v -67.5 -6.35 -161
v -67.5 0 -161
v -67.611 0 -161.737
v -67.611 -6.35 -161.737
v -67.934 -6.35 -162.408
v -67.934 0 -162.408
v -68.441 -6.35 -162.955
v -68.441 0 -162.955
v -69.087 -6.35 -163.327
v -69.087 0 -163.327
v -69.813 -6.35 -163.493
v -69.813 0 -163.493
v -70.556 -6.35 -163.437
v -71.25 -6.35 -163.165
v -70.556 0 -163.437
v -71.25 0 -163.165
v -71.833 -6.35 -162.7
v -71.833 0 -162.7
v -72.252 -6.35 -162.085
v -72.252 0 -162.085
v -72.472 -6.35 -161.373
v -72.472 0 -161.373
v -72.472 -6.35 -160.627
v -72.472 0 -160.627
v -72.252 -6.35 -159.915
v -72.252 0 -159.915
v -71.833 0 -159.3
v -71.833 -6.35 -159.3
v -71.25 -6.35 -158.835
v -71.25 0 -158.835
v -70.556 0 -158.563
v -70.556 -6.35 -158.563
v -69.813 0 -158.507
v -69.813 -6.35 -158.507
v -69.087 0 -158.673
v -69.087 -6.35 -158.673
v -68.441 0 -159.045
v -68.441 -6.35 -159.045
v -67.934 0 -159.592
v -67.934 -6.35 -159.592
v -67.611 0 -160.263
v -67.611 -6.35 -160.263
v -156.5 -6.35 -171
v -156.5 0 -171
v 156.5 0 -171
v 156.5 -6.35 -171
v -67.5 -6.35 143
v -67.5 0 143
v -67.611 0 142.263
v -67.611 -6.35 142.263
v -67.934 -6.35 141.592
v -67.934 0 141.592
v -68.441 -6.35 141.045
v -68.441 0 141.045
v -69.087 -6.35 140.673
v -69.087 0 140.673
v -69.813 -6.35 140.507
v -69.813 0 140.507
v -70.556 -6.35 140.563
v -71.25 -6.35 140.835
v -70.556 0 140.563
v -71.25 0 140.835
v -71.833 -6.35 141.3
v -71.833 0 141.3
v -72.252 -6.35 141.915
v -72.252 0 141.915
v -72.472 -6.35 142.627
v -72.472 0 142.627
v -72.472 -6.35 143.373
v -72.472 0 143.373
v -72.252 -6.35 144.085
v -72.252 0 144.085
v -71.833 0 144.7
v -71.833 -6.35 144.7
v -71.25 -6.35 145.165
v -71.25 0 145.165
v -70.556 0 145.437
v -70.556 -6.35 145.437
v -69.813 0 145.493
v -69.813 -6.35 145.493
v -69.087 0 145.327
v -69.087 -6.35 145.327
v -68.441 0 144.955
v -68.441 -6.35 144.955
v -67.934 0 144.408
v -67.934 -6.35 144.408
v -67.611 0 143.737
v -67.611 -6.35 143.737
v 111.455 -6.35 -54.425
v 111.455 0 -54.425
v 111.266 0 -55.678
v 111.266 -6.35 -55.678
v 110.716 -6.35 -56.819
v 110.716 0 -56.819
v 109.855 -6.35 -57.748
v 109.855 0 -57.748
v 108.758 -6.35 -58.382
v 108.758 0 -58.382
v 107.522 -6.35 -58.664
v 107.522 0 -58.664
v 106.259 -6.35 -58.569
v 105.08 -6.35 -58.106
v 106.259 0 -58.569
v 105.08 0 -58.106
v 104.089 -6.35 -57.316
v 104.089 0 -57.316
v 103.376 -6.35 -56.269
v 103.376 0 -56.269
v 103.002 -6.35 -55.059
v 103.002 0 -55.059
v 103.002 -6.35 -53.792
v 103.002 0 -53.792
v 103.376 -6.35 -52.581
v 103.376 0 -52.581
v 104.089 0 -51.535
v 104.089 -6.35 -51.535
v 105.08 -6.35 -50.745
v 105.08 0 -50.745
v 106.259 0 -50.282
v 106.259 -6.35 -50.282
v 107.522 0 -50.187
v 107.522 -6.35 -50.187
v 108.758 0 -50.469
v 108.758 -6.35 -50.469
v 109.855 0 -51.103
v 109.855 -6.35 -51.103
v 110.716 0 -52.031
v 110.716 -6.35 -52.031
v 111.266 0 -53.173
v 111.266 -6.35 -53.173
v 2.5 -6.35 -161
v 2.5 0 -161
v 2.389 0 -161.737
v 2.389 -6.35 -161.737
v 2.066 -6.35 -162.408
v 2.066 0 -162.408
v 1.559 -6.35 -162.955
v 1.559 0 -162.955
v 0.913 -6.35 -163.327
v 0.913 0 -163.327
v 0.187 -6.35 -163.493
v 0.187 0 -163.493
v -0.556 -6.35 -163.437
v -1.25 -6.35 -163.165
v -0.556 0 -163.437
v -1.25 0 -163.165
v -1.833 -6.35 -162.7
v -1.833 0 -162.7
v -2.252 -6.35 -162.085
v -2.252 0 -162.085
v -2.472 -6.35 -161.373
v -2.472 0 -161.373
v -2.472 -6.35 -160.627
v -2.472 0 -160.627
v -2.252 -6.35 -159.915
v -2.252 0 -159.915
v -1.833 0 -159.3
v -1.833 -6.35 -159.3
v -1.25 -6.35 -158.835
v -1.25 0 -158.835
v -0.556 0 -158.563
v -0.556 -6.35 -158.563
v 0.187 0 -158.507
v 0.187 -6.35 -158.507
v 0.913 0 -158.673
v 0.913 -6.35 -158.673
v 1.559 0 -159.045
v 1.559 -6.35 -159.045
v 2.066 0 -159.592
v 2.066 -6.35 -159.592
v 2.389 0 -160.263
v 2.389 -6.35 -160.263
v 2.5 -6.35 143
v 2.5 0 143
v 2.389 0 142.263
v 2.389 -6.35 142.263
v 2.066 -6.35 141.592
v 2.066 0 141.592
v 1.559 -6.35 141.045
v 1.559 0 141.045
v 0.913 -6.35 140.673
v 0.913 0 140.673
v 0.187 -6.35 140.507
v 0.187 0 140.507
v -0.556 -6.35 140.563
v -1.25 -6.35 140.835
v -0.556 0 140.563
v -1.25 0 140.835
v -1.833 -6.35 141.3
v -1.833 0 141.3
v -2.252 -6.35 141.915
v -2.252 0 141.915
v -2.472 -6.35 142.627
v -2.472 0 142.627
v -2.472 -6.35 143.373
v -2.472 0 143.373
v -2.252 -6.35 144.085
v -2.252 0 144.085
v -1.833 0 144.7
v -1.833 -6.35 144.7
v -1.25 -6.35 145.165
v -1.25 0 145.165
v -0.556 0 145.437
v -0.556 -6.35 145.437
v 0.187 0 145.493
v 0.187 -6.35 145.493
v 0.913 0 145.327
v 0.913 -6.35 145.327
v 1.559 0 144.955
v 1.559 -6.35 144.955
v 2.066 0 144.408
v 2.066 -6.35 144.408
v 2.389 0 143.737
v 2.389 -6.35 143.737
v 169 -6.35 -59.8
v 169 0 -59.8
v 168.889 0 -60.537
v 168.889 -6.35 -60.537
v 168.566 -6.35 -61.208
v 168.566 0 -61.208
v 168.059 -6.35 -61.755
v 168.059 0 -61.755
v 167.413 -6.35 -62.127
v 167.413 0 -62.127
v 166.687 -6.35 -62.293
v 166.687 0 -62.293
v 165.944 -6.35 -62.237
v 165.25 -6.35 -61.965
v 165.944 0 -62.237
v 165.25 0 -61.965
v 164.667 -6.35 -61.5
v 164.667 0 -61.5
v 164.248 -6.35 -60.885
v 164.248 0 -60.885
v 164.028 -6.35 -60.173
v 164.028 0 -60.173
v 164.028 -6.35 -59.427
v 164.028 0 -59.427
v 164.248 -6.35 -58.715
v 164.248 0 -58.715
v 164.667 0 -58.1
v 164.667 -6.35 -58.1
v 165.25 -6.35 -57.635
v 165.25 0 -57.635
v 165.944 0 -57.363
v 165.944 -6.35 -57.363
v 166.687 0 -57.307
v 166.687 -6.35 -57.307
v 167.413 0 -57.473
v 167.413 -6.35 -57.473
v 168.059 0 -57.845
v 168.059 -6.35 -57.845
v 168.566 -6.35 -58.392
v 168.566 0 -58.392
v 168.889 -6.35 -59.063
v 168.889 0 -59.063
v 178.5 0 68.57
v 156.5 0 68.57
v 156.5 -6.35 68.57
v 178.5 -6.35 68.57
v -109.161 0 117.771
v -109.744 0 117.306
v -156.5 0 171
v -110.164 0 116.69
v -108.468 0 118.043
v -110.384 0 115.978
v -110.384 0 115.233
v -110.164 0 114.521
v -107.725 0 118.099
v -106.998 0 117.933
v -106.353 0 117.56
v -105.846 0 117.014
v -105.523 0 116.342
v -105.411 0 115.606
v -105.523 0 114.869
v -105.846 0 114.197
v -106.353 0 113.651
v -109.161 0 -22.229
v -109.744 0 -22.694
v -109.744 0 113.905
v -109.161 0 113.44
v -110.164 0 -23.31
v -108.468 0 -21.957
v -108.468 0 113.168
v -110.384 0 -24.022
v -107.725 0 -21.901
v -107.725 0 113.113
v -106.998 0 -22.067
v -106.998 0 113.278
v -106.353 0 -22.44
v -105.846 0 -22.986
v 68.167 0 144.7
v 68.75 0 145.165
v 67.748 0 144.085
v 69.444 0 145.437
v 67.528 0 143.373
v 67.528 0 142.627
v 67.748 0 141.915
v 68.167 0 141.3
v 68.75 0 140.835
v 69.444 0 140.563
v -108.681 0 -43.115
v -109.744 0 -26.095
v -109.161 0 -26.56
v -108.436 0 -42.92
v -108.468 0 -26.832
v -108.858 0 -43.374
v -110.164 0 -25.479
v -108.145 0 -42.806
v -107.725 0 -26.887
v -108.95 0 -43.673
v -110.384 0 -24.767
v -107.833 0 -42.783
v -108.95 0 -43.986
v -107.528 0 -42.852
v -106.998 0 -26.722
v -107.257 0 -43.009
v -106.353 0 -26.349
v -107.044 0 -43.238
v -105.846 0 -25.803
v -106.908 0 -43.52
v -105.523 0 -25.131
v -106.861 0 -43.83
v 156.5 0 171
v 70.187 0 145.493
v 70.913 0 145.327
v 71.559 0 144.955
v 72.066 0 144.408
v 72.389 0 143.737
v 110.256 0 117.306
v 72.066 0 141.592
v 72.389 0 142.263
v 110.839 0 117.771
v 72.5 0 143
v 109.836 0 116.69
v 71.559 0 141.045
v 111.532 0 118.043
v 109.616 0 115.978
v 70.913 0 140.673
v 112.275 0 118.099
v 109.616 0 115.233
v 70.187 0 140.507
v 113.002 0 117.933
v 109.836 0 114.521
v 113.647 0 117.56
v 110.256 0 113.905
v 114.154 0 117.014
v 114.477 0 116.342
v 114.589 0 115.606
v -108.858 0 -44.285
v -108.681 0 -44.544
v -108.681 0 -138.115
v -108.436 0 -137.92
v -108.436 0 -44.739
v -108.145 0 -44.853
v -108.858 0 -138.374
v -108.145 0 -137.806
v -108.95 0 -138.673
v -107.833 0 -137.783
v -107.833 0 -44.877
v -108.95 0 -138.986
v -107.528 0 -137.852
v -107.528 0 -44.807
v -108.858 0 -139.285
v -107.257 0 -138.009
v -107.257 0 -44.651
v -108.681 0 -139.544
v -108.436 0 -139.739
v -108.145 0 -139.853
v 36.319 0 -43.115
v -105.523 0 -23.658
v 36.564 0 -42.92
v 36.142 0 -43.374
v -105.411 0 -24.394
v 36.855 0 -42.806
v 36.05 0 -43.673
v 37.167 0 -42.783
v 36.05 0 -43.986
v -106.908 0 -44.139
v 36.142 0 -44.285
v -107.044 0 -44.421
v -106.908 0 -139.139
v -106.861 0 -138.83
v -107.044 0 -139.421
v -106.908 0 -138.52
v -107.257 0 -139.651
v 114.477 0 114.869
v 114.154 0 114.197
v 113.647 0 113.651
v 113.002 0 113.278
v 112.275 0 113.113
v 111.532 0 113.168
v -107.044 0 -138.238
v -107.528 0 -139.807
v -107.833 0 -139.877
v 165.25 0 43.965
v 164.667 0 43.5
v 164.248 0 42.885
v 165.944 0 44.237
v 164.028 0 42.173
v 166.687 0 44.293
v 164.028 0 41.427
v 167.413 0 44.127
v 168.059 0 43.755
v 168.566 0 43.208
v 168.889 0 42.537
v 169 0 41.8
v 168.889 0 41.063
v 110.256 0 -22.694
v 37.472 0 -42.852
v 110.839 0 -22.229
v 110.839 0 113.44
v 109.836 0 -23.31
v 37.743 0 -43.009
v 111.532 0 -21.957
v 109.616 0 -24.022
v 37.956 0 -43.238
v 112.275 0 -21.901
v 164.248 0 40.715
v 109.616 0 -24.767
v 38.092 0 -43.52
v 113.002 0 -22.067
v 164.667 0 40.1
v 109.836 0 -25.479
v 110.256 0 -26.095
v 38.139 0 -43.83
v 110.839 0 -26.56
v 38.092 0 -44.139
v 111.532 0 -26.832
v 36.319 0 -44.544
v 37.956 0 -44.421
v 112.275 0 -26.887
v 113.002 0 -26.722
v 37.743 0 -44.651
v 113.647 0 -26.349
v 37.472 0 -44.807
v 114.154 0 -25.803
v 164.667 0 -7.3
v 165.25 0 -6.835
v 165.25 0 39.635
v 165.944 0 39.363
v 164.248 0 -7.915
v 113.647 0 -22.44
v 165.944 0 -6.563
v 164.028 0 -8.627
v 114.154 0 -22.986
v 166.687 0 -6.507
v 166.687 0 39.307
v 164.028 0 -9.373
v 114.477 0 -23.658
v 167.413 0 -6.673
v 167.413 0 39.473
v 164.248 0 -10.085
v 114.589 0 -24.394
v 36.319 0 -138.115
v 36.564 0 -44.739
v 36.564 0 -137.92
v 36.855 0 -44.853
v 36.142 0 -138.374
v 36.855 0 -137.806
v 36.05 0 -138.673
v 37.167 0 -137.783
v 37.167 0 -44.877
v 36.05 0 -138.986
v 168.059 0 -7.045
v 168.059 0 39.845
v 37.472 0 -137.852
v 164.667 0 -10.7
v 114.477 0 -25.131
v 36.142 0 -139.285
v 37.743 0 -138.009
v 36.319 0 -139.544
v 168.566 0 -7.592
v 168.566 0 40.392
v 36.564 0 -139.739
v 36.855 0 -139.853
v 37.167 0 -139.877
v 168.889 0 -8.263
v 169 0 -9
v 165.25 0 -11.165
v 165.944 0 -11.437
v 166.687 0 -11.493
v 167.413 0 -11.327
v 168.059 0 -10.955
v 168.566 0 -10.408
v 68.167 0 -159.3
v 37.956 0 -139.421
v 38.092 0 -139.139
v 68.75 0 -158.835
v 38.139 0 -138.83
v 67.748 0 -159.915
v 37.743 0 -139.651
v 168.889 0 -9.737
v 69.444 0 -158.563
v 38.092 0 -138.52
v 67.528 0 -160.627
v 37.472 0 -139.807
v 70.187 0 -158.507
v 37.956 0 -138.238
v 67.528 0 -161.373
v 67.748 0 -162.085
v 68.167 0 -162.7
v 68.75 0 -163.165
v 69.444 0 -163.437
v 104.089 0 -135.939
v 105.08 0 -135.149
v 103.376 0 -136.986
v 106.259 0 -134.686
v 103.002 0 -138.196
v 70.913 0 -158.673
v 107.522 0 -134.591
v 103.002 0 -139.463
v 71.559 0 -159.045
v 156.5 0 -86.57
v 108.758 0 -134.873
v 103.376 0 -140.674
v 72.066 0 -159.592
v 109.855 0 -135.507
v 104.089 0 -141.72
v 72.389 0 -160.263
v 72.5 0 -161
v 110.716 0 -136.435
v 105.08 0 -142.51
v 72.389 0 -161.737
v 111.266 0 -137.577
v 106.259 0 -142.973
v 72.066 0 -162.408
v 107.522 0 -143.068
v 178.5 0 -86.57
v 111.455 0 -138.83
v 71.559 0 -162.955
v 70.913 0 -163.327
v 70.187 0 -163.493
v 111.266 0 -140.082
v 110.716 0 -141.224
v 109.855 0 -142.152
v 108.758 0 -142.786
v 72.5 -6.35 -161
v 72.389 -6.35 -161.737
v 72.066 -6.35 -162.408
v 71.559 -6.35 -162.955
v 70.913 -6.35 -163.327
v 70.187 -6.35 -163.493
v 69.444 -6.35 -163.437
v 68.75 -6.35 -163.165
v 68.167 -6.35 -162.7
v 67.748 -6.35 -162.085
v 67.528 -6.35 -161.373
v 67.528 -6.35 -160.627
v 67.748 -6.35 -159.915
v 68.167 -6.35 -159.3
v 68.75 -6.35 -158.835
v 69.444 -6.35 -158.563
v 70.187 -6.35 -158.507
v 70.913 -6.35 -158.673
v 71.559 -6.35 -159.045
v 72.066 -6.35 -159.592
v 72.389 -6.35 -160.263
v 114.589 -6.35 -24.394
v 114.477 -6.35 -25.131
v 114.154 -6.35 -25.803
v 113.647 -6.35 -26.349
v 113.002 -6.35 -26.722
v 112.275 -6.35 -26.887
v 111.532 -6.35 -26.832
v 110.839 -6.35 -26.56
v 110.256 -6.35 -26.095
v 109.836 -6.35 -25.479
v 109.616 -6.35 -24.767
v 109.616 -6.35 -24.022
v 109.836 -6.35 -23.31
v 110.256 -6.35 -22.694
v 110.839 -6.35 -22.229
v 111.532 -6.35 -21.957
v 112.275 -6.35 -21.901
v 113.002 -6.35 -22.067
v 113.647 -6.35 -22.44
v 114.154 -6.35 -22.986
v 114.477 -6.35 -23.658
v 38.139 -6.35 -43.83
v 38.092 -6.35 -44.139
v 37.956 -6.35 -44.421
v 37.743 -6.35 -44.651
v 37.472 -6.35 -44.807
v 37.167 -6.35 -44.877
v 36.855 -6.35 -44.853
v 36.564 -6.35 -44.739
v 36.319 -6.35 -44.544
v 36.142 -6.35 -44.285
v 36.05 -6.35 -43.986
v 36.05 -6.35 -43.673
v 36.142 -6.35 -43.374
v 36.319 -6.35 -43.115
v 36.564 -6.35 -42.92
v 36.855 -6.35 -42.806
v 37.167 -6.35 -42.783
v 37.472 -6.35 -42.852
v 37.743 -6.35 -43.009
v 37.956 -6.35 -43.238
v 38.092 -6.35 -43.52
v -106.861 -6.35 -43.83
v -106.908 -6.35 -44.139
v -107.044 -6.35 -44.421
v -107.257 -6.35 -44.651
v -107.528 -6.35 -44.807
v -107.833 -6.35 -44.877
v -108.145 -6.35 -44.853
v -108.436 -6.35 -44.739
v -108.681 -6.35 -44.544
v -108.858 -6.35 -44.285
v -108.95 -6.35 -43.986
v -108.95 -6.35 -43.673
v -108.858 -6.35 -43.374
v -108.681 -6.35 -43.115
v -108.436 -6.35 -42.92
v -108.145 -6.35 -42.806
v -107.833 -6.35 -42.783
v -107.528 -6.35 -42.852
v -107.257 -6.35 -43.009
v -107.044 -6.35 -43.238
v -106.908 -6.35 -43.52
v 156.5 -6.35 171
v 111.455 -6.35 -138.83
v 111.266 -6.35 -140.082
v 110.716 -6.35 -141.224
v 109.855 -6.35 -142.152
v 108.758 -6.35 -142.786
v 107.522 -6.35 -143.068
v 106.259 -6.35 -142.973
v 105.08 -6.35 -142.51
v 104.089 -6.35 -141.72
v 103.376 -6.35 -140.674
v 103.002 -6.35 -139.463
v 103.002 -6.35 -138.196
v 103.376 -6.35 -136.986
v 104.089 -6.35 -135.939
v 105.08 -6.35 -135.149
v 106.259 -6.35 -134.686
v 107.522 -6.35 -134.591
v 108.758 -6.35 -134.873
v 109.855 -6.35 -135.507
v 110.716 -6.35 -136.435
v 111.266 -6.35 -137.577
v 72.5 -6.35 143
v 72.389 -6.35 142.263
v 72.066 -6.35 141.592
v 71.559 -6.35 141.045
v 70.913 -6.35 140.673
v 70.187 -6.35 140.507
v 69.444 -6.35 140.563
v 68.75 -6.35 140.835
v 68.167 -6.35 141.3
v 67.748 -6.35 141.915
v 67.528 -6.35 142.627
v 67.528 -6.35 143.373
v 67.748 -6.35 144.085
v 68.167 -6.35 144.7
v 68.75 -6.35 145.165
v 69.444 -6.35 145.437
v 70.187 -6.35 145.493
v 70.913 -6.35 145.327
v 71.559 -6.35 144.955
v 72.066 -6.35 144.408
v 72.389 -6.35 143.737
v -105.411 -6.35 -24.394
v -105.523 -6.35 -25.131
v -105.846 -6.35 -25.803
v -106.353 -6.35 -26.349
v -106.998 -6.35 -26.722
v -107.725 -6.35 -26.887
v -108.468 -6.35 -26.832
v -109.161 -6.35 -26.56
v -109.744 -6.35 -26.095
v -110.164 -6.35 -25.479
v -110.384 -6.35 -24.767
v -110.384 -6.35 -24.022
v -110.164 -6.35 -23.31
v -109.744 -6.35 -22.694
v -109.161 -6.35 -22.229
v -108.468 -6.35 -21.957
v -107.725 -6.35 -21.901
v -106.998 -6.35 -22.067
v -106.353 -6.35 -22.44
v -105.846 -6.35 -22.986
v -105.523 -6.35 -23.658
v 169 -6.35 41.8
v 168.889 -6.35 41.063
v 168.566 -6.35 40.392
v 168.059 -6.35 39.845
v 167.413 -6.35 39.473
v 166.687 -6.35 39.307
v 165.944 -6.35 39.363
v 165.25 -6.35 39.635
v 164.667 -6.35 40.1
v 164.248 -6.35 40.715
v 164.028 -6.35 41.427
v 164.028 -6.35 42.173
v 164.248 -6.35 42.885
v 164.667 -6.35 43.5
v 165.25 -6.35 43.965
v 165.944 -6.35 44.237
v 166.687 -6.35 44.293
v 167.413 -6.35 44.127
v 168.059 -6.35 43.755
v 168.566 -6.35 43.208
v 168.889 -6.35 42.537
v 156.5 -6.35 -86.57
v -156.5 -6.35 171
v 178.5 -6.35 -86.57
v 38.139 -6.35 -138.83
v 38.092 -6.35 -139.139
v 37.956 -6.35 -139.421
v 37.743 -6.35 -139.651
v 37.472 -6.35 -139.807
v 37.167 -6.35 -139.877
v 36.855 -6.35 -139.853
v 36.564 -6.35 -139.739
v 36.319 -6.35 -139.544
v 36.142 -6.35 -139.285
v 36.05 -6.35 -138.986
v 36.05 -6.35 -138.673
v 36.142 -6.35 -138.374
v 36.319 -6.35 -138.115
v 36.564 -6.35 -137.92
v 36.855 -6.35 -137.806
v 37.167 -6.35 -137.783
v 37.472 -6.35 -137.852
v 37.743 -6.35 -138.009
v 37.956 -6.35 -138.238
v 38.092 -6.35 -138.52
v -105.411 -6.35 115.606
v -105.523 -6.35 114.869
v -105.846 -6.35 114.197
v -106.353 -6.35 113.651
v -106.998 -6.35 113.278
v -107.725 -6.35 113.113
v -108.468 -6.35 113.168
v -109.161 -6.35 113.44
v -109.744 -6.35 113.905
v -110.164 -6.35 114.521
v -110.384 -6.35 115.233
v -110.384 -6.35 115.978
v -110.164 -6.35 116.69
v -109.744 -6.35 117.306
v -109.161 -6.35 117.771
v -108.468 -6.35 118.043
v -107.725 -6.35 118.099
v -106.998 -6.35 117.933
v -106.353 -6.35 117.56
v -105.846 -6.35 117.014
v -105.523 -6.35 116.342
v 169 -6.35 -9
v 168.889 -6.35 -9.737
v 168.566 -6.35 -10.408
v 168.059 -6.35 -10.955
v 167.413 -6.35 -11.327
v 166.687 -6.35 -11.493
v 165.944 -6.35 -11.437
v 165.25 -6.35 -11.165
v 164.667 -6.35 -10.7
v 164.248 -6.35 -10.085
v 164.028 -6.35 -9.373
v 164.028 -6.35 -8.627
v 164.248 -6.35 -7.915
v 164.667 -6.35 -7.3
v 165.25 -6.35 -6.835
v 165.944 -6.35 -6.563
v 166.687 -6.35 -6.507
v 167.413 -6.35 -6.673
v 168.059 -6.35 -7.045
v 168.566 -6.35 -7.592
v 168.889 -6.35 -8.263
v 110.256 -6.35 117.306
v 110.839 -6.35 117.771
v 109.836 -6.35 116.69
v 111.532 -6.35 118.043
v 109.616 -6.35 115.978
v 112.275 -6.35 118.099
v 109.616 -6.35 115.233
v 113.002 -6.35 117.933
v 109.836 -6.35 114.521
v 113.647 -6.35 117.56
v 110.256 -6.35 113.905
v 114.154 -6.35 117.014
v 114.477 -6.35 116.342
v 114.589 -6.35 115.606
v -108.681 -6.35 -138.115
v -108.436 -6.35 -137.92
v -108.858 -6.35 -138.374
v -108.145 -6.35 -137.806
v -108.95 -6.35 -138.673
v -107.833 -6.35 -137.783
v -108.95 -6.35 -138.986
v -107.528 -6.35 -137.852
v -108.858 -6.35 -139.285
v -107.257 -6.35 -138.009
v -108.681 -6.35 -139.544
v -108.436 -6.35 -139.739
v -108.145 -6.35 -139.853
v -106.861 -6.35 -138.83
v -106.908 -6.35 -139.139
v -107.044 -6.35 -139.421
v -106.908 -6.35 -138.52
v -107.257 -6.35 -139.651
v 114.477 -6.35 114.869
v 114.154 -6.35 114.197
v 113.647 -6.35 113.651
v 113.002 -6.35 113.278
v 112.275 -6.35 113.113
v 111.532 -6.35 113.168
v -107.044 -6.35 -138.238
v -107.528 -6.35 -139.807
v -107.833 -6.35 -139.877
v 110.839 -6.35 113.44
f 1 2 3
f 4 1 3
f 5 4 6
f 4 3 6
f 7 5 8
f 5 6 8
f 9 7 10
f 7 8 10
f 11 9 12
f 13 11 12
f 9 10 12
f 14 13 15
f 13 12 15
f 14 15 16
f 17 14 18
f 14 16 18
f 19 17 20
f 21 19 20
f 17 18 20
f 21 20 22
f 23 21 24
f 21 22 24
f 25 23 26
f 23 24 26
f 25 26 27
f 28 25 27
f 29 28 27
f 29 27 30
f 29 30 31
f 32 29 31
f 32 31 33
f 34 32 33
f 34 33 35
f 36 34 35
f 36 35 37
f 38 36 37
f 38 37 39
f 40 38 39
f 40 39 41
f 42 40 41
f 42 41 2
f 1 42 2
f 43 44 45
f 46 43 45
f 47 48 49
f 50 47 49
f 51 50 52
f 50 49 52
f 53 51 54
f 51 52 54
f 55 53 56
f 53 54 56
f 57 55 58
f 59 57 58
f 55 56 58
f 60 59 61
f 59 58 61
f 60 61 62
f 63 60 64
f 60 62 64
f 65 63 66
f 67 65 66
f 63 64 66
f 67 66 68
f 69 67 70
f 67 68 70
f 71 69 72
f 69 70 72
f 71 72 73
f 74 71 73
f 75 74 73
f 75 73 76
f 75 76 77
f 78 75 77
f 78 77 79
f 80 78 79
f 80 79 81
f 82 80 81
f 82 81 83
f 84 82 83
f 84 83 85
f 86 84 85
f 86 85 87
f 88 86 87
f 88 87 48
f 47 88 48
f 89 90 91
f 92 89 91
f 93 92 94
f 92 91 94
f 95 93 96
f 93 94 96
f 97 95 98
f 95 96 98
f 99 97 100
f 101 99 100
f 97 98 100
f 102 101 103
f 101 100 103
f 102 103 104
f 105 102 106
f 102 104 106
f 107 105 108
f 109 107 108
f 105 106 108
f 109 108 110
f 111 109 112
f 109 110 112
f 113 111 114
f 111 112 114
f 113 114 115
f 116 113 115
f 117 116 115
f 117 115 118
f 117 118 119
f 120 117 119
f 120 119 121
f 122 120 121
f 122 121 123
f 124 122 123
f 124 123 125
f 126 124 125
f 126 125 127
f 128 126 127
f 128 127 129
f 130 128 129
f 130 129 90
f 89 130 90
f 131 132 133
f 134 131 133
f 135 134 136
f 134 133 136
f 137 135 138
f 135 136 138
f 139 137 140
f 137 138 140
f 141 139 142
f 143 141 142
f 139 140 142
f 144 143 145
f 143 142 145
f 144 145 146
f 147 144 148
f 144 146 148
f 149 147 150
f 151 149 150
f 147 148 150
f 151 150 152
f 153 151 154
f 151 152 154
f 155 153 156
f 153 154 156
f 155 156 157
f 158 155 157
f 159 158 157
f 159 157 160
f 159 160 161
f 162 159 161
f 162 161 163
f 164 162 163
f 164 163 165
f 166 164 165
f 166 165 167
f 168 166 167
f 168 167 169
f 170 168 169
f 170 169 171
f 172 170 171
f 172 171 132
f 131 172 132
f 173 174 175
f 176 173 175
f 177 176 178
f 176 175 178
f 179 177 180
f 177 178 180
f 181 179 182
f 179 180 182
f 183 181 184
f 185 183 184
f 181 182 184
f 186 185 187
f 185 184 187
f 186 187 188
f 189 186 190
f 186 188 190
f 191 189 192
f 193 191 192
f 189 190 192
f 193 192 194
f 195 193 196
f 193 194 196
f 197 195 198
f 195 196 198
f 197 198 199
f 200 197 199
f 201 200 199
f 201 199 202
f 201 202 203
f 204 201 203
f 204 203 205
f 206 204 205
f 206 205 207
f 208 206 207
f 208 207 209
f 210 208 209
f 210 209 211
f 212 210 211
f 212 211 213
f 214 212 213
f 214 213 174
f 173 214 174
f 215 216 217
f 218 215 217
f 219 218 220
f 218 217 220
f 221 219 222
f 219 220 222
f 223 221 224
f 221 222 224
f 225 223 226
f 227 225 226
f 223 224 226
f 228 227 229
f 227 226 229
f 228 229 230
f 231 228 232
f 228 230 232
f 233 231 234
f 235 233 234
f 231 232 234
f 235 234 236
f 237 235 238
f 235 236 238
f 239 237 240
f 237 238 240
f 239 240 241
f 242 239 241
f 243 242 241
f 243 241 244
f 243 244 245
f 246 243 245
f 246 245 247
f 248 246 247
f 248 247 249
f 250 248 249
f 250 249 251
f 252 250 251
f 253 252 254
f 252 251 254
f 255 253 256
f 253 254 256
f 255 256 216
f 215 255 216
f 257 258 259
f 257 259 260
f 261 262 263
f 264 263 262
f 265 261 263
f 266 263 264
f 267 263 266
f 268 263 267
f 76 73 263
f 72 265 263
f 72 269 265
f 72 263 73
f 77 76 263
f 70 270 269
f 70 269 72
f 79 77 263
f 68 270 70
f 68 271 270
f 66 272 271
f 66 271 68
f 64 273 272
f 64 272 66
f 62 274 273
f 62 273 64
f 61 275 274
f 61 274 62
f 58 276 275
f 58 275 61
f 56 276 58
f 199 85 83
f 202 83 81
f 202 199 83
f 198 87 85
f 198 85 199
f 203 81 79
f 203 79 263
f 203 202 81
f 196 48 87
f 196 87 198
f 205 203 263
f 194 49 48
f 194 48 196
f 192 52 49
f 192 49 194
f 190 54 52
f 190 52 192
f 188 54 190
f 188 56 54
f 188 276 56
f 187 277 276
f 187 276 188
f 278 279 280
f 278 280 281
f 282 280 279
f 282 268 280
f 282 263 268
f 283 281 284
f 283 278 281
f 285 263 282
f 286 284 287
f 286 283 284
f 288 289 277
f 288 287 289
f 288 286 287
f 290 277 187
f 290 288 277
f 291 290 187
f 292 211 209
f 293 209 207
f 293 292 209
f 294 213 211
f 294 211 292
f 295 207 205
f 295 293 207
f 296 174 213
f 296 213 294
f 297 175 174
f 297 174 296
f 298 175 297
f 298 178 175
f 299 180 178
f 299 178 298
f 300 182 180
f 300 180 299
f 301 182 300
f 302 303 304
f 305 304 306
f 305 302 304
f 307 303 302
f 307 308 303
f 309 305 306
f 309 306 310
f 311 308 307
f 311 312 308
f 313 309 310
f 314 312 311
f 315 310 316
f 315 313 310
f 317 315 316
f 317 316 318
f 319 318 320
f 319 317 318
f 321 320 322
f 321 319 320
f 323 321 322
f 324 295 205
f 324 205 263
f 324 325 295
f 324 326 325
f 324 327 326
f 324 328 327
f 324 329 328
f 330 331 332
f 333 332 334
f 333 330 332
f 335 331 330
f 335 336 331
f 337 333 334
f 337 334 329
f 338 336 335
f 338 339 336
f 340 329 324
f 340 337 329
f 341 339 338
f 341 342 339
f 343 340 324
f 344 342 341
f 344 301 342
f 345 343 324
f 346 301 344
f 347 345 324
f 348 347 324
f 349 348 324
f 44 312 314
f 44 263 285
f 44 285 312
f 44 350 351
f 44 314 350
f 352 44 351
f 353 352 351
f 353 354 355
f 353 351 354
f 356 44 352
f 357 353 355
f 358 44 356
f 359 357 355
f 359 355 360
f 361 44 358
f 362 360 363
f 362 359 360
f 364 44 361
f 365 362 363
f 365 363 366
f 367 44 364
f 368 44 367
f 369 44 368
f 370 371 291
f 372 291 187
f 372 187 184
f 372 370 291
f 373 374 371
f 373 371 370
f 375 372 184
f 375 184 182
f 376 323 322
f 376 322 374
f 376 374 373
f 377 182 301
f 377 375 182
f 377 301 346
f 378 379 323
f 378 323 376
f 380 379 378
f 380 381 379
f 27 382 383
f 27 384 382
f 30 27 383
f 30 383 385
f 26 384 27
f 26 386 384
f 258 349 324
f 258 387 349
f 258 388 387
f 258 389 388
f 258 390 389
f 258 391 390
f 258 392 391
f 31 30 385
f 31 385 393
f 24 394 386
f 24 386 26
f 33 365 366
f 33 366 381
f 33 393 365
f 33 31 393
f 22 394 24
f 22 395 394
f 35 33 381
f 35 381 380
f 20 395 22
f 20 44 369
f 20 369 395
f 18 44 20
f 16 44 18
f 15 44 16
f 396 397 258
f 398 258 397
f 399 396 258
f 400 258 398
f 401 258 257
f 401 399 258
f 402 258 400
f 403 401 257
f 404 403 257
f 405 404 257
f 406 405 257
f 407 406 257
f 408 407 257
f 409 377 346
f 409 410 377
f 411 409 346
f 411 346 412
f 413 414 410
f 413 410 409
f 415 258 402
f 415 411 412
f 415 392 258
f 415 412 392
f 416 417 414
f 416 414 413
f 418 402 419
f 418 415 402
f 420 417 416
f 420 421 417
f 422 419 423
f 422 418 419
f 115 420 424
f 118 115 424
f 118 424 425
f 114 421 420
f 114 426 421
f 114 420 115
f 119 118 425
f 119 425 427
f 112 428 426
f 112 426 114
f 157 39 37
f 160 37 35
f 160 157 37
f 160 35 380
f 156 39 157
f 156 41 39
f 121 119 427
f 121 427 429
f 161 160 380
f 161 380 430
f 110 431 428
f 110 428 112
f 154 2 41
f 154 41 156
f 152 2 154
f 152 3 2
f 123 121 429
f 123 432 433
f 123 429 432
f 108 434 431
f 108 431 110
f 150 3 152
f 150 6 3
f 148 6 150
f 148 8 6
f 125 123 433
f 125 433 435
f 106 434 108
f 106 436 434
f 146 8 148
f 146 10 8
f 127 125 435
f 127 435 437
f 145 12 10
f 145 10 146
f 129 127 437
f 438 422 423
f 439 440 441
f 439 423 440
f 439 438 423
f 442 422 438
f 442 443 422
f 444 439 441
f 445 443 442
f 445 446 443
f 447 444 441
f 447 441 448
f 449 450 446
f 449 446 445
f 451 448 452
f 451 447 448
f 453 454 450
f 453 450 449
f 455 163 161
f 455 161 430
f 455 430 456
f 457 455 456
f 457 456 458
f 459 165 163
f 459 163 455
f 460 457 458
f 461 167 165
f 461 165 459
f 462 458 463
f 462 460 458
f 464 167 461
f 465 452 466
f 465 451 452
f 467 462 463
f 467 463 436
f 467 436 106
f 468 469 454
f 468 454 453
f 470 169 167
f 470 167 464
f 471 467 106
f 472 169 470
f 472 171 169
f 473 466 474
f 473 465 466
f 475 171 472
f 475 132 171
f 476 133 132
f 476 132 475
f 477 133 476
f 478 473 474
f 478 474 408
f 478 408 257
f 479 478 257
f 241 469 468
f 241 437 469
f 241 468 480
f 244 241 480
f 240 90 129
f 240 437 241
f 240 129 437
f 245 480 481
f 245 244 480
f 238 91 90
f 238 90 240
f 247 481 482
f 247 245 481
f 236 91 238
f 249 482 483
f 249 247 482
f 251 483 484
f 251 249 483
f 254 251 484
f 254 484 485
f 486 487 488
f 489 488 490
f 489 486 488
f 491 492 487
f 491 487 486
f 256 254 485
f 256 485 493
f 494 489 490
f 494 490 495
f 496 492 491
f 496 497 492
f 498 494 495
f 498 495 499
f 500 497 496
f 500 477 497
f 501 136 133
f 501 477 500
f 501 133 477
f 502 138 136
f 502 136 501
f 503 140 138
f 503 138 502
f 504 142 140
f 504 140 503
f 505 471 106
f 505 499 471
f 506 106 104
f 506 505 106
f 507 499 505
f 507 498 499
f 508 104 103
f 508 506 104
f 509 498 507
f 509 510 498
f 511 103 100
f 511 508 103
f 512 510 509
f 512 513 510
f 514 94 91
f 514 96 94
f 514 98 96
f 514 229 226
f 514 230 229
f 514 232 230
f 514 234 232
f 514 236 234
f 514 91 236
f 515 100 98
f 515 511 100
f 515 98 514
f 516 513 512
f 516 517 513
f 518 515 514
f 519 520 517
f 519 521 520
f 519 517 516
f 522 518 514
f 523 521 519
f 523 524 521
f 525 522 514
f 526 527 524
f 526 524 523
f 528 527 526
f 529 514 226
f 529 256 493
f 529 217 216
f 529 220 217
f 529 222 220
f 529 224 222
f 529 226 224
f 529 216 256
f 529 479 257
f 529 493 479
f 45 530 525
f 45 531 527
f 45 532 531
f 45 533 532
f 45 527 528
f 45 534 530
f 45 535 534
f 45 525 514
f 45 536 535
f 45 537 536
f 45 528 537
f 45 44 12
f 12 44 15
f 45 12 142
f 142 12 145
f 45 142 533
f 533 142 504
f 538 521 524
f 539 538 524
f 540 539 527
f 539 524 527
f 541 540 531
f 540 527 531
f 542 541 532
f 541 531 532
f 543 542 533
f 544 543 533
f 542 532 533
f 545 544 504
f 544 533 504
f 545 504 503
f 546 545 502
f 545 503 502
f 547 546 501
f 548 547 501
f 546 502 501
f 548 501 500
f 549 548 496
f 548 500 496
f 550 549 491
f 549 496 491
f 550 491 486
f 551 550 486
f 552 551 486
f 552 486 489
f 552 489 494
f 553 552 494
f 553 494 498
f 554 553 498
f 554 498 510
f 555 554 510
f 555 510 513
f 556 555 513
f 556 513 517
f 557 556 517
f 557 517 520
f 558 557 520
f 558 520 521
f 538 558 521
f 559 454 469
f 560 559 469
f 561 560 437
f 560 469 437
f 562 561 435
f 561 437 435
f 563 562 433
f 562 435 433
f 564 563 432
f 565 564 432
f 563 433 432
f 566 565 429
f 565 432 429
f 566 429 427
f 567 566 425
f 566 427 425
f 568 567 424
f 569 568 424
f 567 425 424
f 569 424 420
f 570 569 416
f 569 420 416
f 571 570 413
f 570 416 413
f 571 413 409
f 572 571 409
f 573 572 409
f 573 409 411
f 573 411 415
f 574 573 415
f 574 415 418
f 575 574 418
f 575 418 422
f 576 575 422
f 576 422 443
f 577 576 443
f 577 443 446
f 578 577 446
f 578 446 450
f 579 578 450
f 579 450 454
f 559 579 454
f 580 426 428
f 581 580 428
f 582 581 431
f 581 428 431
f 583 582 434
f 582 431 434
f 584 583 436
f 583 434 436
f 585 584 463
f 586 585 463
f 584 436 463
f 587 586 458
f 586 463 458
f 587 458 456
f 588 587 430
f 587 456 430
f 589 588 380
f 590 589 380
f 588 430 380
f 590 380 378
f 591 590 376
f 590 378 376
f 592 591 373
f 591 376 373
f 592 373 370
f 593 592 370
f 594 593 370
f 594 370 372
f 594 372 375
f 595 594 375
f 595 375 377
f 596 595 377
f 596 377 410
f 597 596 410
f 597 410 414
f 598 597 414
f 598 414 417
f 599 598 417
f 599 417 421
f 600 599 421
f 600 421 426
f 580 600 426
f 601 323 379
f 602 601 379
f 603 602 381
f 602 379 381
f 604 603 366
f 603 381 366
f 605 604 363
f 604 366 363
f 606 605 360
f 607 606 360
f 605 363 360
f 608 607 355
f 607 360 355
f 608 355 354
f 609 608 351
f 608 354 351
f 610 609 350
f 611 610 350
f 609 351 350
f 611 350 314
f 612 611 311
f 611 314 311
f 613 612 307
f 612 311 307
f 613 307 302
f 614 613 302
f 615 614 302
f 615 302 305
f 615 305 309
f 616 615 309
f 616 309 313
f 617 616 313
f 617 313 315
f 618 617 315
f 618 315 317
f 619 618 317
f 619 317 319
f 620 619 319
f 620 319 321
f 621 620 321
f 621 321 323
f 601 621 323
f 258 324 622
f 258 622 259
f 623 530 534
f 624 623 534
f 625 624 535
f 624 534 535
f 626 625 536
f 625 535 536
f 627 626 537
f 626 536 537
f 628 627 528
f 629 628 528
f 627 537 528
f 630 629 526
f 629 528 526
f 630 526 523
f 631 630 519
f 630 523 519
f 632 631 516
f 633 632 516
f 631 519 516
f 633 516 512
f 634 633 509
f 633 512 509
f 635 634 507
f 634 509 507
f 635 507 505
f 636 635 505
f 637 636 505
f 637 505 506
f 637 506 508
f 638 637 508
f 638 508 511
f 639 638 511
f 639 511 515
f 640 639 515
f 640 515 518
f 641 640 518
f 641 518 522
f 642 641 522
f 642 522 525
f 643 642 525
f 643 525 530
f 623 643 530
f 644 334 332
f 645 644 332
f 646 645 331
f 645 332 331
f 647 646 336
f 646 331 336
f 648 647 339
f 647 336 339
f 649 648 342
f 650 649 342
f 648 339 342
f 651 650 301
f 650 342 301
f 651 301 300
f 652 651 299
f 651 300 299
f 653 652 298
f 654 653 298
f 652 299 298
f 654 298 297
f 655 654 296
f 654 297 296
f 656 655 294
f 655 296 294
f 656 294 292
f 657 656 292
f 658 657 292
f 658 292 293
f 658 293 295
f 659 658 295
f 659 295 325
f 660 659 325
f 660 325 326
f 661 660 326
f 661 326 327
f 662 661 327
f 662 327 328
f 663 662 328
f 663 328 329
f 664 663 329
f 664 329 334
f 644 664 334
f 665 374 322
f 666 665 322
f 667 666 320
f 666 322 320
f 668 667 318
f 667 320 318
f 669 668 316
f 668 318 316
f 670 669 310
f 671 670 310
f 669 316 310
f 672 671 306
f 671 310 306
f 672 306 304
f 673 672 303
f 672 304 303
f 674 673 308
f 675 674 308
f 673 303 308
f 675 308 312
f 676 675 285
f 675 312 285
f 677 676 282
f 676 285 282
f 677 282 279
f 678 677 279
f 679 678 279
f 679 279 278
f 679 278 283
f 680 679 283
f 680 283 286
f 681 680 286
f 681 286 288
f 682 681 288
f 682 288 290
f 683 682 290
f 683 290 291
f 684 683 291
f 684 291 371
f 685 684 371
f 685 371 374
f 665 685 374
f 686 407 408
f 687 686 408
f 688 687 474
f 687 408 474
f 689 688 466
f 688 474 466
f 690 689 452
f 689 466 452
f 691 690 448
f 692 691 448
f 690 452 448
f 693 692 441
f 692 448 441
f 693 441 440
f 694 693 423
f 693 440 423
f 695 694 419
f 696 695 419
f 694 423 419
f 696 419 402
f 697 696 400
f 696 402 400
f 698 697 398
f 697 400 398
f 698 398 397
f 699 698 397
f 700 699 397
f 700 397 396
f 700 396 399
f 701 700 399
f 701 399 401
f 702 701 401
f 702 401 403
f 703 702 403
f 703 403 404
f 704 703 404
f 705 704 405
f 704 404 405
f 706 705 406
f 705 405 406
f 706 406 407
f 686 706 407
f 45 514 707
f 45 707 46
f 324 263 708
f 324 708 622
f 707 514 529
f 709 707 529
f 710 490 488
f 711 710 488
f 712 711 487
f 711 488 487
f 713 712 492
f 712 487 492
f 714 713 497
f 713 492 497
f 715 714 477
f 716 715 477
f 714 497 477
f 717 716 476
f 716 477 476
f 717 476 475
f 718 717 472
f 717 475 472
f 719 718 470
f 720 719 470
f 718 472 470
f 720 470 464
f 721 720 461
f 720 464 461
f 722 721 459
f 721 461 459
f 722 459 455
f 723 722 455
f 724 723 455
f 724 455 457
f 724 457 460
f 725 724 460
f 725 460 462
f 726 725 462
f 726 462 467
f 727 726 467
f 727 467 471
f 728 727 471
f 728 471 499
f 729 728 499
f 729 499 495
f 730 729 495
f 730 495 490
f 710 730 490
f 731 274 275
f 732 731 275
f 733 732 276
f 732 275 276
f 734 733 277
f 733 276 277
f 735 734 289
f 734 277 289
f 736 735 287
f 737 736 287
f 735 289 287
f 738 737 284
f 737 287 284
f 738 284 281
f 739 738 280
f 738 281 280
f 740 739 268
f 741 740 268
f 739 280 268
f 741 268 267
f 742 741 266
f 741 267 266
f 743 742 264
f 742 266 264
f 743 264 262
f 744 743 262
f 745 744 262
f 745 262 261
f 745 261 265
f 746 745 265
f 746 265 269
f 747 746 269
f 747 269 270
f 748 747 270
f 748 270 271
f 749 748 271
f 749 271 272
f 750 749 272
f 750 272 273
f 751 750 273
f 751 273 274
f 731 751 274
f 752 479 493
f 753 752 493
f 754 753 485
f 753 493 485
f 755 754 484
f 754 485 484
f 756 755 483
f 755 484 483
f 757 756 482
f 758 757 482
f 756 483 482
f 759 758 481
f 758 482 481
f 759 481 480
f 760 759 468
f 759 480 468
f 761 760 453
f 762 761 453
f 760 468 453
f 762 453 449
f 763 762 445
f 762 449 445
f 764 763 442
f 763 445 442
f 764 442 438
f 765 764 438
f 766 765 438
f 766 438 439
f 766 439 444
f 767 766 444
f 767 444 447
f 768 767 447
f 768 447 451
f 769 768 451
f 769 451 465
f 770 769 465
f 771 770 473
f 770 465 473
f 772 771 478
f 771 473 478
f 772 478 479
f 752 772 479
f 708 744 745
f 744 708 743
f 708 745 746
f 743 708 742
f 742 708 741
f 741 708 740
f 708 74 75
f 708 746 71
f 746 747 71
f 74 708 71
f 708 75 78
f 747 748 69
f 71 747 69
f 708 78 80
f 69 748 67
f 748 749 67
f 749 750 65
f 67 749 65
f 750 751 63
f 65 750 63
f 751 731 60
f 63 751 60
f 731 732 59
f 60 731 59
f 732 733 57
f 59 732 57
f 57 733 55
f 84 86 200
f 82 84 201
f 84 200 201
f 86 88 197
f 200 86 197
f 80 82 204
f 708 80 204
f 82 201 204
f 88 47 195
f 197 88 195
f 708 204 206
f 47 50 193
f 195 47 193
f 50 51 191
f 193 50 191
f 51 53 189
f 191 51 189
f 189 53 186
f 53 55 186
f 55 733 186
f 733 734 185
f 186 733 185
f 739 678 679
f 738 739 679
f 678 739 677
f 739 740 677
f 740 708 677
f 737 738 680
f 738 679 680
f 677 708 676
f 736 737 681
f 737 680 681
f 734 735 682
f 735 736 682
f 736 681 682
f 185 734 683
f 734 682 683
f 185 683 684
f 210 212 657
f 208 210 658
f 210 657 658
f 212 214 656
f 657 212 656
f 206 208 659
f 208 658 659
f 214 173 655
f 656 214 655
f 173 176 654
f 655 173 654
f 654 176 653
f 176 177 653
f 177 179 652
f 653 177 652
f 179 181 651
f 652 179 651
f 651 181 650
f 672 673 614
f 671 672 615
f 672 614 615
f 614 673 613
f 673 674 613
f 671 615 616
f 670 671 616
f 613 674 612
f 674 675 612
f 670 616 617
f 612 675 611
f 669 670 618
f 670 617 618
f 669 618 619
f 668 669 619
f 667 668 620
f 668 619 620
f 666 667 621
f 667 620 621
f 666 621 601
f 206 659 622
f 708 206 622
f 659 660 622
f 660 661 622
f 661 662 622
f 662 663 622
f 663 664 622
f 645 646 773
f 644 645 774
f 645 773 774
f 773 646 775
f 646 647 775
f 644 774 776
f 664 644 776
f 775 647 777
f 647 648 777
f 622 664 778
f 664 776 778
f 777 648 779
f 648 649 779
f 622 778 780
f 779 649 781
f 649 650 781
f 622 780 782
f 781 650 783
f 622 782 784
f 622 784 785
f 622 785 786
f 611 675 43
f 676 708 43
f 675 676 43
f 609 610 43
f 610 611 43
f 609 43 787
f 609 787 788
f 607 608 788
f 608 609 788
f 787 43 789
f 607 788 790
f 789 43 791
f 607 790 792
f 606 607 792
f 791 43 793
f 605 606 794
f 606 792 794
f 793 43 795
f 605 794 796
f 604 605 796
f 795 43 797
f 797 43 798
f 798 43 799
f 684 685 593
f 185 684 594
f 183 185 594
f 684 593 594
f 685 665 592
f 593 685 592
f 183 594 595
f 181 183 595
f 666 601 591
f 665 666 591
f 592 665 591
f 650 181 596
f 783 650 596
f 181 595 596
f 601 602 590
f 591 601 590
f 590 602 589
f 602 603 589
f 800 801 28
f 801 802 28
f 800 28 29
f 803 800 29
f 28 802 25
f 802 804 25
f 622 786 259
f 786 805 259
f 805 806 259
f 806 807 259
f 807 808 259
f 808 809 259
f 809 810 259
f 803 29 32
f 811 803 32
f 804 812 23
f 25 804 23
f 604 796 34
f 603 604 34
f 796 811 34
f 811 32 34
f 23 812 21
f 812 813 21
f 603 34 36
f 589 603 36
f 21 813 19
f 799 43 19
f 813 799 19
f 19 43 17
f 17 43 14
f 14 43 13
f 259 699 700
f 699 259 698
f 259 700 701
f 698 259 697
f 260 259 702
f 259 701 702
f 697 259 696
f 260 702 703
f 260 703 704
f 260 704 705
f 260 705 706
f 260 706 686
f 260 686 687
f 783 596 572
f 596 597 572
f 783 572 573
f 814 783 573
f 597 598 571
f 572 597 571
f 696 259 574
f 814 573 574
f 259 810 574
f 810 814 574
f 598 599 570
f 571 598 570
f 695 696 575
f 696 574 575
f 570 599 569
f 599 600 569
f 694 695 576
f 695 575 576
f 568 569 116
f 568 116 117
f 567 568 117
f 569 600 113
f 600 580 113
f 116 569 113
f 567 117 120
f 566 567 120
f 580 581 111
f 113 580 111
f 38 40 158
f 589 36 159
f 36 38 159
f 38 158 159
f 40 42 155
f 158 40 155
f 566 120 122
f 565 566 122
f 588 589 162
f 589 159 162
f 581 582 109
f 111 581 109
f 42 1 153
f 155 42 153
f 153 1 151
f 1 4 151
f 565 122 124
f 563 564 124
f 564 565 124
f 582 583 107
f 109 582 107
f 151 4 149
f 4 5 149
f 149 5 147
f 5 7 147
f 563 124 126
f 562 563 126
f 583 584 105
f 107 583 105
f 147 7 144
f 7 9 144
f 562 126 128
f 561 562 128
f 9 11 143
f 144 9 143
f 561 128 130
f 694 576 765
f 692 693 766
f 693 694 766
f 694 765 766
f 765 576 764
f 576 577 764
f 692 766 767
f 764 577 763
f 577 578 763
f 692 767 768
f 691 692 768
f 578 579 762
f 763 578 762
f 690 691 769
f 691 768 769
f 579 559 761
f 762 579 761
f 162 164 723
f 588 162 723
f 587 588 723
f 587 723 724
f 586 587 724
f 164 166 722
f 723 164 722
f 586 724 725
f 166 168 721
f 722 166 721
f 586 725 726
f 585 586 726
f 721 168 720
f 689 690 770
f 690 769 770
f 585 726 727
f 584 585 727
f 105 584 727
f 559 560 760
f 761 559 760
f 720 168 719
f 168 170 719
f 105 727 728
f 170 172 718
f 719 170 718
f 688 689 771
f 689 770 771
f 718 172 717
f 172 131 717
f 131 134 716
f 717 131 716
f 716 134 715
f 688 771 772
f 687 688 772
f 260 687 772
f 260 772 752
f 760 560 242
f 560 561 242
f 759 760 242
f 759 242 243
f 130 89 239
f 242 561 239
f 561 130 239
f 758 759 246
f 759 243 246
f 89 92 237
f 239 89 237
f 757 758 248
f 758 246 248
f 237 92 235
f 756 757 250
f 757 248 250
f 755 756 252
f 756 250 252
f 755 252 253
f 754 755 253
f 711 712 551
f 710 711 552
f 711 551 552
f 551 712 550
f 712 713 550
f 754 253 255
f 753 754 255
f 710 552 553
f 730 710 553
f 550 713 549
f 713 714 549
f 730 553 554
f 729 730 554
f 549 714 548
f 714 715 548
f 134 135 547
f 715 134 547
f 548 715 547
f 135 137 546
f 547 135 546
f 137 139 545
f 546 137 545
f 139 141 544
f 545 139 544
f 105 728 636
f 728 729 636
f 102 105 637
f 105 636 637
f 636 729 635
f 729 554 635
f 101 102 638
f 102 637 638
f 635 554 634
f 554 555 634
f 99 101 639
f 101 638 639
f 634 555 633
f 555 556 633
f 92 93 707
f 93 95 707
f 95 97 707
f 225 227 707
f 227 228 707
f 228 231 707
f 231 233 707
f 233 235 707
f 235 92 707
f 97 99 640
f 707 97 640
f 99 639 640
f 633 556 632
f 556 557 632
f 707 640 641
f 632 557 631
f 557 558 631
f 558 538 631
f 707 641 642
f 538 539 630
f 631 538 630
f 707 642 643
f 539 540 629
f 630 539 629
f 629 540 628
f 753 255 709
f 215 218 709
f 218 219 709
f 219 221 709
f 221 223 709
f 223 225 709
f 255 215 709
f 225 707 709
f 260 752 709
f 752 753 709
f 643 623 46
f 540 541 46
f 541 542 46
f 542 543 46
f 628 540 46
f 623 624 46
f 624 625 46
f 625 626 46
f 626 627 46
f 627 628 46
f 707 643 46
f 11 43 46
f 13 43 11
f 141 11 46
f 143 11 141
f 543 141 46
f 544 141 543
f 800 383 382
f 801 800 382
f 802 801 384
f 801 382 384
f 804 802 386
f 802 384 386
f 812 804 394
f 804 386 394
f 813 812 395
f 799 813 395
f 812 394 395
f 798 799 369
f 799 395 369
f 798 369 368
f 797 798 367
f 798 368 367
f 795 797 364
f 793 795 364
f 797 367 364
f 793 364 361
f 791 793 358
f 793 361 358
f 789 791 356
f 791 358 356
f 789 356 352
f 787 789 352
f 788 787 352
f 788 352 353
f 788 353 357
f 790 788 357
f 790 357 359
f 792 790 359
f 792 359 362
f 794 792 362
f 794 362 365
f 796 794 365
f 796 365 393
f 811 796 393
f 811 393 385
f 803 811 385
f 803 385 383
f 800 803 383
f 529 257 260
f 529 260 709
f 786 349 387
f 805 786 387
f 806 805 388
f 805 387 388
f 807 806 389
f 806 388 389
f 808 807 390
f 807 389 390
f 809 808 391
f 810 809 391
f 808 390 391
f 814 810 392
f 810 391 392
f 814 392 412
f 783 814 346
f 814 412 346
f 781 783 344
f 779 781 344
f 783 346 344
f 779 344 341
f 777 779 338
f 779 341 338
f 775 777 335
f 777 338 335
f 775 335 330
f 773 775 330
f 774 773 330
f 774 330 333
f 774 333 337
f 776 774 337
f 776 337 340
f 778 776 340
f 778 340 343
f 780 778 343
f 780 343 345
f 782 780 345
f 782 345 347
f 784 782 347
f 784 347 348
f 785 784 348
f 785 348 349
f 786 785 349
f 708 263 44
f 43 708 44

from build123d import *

# Parameters (mm, degrees)
SKETCH1_W           = 313
SKETCH1_H           = 342
BOSS_EXTRUDE1_DEPTH = 6.35
SKETCH3_W           = 22
SKETCH3_H           = 155.14040353
SKETCH3_R           = 2.5
BOSS_EXTRUDE2_DEPTH = 6.35
SKETCH2_R           = 2.5
CUT_EXTRUDE1_DEPTH  = 7.35
SKETCH4_R           = 4.25
SKETCH4_R_2         = 2.5
SKETCH4_R_3         = 1.05
CUT_EXTRUDE2_DEPTH  = 7.35


with BuildPart() as part:
    # Sketch1 → Boss-Extrude1 (new body)
    with BuildSketch(Plane(origin=(0, 0, 0), x_dir=(1, 0, 0), z_dir=(0, 1, 0))):
        Rectangle(SKETCH1_W, SKETCH1_H)
    extrude(amount=-BOSS_EXTRUDE1_DEPTH)

    # Sketch3 → Boss-Extrude2 (add)
    with BuildSketch(Plane(origin=(0, 0, 0), x_dir=(1, 0, 0), z_dir=(0, 1, 0))):
        with Locations((167.5, 9)):
            Rectangle(SKETCH3_W, SKETCH3_H)
        with Locations((166.5, 9)):
            Circle(SKETCH3_R, mode=Mode.SUBTRACT)
        with Locations((166.5, -41.8)):
            Circle(SKETCH3_R, mode=Mode.SUBTRACT)
        with Locations((166.5, 59.8)):
            Circle(SKETCH3_R, mode=Mode.SUBTRACT)
    extrude(amount=-BOSS_EXTRUDE2_DEPTH)

    # Sketch2 → Cut-Extrude1 (cut, through all)
    with BuildSketch(Plane(origin=(0, 0, 0), x_dir=(1, 0, 0), z_dir=(0, 1, 0))):
        with Locations((0, -143)):
            Circle(SKETCH2_R)
        with Locations((-70, -143)):
            Circle(SKETCH2_R)
        with Locations((70, -143)):
            Circle(SKETCH2_R)
        with Locations((-70, 161)):
            Circle(SKETCH2_R)
        with Locations((0, 161)):
            Circle(SKETCH2_R)
        with Locations((70, 161)):
            Circle(SKETCH2_R)
    extrude(amount=-CUT_EXTRUDE1_DEPTH, mode=Mode.SUBTRACT)

    # Sketch4 → Cut-Extrude2 (cut, through all)
    with BuildSketch(Plane(origin=(0, 0, 0), x_dir=(1, 0, 0), z_dir=(0, 1, 0))):
        with Locations((107.204882136, 138.829587854)):
            Circle(SKETCH4_R)
        with Locations((107.204882136, 54.425387854)):
            Circle(SKETCH4_R)
        with Locations((-107.911484214, -115.605535397)):
            Circle(SKETCH4_R_2)
        with Locations((-107.911484214, 24.394464603)):
            Circle(SKETCH4_R_2)
        with Locations((112.088515786, 24.394464603)):
            Circle(SKETCH4_R_2)
        with Locations((112.088515786, -115.605535397)):
            Circle(SKETCH4_R_2)
        with Locations((-107.911484214, 138.829587854)):
            Circle(SKETCH4_R_3)
        with Locations((37.088515786, 138.829587854)):
            Circle(SKETCH4_R_3)
        with Locations((37.088515786, 43.829587854)):
            Circle(SKETCH4_R_3)
        with Locations((-107.911484214, 43.829587854)):
            Circle(SKETCH4_R_3)
    extrude(amount=-CUT_EXTRUDE2_DEPTH, mode=Mode.SUBTRACT)


solid = part.part
